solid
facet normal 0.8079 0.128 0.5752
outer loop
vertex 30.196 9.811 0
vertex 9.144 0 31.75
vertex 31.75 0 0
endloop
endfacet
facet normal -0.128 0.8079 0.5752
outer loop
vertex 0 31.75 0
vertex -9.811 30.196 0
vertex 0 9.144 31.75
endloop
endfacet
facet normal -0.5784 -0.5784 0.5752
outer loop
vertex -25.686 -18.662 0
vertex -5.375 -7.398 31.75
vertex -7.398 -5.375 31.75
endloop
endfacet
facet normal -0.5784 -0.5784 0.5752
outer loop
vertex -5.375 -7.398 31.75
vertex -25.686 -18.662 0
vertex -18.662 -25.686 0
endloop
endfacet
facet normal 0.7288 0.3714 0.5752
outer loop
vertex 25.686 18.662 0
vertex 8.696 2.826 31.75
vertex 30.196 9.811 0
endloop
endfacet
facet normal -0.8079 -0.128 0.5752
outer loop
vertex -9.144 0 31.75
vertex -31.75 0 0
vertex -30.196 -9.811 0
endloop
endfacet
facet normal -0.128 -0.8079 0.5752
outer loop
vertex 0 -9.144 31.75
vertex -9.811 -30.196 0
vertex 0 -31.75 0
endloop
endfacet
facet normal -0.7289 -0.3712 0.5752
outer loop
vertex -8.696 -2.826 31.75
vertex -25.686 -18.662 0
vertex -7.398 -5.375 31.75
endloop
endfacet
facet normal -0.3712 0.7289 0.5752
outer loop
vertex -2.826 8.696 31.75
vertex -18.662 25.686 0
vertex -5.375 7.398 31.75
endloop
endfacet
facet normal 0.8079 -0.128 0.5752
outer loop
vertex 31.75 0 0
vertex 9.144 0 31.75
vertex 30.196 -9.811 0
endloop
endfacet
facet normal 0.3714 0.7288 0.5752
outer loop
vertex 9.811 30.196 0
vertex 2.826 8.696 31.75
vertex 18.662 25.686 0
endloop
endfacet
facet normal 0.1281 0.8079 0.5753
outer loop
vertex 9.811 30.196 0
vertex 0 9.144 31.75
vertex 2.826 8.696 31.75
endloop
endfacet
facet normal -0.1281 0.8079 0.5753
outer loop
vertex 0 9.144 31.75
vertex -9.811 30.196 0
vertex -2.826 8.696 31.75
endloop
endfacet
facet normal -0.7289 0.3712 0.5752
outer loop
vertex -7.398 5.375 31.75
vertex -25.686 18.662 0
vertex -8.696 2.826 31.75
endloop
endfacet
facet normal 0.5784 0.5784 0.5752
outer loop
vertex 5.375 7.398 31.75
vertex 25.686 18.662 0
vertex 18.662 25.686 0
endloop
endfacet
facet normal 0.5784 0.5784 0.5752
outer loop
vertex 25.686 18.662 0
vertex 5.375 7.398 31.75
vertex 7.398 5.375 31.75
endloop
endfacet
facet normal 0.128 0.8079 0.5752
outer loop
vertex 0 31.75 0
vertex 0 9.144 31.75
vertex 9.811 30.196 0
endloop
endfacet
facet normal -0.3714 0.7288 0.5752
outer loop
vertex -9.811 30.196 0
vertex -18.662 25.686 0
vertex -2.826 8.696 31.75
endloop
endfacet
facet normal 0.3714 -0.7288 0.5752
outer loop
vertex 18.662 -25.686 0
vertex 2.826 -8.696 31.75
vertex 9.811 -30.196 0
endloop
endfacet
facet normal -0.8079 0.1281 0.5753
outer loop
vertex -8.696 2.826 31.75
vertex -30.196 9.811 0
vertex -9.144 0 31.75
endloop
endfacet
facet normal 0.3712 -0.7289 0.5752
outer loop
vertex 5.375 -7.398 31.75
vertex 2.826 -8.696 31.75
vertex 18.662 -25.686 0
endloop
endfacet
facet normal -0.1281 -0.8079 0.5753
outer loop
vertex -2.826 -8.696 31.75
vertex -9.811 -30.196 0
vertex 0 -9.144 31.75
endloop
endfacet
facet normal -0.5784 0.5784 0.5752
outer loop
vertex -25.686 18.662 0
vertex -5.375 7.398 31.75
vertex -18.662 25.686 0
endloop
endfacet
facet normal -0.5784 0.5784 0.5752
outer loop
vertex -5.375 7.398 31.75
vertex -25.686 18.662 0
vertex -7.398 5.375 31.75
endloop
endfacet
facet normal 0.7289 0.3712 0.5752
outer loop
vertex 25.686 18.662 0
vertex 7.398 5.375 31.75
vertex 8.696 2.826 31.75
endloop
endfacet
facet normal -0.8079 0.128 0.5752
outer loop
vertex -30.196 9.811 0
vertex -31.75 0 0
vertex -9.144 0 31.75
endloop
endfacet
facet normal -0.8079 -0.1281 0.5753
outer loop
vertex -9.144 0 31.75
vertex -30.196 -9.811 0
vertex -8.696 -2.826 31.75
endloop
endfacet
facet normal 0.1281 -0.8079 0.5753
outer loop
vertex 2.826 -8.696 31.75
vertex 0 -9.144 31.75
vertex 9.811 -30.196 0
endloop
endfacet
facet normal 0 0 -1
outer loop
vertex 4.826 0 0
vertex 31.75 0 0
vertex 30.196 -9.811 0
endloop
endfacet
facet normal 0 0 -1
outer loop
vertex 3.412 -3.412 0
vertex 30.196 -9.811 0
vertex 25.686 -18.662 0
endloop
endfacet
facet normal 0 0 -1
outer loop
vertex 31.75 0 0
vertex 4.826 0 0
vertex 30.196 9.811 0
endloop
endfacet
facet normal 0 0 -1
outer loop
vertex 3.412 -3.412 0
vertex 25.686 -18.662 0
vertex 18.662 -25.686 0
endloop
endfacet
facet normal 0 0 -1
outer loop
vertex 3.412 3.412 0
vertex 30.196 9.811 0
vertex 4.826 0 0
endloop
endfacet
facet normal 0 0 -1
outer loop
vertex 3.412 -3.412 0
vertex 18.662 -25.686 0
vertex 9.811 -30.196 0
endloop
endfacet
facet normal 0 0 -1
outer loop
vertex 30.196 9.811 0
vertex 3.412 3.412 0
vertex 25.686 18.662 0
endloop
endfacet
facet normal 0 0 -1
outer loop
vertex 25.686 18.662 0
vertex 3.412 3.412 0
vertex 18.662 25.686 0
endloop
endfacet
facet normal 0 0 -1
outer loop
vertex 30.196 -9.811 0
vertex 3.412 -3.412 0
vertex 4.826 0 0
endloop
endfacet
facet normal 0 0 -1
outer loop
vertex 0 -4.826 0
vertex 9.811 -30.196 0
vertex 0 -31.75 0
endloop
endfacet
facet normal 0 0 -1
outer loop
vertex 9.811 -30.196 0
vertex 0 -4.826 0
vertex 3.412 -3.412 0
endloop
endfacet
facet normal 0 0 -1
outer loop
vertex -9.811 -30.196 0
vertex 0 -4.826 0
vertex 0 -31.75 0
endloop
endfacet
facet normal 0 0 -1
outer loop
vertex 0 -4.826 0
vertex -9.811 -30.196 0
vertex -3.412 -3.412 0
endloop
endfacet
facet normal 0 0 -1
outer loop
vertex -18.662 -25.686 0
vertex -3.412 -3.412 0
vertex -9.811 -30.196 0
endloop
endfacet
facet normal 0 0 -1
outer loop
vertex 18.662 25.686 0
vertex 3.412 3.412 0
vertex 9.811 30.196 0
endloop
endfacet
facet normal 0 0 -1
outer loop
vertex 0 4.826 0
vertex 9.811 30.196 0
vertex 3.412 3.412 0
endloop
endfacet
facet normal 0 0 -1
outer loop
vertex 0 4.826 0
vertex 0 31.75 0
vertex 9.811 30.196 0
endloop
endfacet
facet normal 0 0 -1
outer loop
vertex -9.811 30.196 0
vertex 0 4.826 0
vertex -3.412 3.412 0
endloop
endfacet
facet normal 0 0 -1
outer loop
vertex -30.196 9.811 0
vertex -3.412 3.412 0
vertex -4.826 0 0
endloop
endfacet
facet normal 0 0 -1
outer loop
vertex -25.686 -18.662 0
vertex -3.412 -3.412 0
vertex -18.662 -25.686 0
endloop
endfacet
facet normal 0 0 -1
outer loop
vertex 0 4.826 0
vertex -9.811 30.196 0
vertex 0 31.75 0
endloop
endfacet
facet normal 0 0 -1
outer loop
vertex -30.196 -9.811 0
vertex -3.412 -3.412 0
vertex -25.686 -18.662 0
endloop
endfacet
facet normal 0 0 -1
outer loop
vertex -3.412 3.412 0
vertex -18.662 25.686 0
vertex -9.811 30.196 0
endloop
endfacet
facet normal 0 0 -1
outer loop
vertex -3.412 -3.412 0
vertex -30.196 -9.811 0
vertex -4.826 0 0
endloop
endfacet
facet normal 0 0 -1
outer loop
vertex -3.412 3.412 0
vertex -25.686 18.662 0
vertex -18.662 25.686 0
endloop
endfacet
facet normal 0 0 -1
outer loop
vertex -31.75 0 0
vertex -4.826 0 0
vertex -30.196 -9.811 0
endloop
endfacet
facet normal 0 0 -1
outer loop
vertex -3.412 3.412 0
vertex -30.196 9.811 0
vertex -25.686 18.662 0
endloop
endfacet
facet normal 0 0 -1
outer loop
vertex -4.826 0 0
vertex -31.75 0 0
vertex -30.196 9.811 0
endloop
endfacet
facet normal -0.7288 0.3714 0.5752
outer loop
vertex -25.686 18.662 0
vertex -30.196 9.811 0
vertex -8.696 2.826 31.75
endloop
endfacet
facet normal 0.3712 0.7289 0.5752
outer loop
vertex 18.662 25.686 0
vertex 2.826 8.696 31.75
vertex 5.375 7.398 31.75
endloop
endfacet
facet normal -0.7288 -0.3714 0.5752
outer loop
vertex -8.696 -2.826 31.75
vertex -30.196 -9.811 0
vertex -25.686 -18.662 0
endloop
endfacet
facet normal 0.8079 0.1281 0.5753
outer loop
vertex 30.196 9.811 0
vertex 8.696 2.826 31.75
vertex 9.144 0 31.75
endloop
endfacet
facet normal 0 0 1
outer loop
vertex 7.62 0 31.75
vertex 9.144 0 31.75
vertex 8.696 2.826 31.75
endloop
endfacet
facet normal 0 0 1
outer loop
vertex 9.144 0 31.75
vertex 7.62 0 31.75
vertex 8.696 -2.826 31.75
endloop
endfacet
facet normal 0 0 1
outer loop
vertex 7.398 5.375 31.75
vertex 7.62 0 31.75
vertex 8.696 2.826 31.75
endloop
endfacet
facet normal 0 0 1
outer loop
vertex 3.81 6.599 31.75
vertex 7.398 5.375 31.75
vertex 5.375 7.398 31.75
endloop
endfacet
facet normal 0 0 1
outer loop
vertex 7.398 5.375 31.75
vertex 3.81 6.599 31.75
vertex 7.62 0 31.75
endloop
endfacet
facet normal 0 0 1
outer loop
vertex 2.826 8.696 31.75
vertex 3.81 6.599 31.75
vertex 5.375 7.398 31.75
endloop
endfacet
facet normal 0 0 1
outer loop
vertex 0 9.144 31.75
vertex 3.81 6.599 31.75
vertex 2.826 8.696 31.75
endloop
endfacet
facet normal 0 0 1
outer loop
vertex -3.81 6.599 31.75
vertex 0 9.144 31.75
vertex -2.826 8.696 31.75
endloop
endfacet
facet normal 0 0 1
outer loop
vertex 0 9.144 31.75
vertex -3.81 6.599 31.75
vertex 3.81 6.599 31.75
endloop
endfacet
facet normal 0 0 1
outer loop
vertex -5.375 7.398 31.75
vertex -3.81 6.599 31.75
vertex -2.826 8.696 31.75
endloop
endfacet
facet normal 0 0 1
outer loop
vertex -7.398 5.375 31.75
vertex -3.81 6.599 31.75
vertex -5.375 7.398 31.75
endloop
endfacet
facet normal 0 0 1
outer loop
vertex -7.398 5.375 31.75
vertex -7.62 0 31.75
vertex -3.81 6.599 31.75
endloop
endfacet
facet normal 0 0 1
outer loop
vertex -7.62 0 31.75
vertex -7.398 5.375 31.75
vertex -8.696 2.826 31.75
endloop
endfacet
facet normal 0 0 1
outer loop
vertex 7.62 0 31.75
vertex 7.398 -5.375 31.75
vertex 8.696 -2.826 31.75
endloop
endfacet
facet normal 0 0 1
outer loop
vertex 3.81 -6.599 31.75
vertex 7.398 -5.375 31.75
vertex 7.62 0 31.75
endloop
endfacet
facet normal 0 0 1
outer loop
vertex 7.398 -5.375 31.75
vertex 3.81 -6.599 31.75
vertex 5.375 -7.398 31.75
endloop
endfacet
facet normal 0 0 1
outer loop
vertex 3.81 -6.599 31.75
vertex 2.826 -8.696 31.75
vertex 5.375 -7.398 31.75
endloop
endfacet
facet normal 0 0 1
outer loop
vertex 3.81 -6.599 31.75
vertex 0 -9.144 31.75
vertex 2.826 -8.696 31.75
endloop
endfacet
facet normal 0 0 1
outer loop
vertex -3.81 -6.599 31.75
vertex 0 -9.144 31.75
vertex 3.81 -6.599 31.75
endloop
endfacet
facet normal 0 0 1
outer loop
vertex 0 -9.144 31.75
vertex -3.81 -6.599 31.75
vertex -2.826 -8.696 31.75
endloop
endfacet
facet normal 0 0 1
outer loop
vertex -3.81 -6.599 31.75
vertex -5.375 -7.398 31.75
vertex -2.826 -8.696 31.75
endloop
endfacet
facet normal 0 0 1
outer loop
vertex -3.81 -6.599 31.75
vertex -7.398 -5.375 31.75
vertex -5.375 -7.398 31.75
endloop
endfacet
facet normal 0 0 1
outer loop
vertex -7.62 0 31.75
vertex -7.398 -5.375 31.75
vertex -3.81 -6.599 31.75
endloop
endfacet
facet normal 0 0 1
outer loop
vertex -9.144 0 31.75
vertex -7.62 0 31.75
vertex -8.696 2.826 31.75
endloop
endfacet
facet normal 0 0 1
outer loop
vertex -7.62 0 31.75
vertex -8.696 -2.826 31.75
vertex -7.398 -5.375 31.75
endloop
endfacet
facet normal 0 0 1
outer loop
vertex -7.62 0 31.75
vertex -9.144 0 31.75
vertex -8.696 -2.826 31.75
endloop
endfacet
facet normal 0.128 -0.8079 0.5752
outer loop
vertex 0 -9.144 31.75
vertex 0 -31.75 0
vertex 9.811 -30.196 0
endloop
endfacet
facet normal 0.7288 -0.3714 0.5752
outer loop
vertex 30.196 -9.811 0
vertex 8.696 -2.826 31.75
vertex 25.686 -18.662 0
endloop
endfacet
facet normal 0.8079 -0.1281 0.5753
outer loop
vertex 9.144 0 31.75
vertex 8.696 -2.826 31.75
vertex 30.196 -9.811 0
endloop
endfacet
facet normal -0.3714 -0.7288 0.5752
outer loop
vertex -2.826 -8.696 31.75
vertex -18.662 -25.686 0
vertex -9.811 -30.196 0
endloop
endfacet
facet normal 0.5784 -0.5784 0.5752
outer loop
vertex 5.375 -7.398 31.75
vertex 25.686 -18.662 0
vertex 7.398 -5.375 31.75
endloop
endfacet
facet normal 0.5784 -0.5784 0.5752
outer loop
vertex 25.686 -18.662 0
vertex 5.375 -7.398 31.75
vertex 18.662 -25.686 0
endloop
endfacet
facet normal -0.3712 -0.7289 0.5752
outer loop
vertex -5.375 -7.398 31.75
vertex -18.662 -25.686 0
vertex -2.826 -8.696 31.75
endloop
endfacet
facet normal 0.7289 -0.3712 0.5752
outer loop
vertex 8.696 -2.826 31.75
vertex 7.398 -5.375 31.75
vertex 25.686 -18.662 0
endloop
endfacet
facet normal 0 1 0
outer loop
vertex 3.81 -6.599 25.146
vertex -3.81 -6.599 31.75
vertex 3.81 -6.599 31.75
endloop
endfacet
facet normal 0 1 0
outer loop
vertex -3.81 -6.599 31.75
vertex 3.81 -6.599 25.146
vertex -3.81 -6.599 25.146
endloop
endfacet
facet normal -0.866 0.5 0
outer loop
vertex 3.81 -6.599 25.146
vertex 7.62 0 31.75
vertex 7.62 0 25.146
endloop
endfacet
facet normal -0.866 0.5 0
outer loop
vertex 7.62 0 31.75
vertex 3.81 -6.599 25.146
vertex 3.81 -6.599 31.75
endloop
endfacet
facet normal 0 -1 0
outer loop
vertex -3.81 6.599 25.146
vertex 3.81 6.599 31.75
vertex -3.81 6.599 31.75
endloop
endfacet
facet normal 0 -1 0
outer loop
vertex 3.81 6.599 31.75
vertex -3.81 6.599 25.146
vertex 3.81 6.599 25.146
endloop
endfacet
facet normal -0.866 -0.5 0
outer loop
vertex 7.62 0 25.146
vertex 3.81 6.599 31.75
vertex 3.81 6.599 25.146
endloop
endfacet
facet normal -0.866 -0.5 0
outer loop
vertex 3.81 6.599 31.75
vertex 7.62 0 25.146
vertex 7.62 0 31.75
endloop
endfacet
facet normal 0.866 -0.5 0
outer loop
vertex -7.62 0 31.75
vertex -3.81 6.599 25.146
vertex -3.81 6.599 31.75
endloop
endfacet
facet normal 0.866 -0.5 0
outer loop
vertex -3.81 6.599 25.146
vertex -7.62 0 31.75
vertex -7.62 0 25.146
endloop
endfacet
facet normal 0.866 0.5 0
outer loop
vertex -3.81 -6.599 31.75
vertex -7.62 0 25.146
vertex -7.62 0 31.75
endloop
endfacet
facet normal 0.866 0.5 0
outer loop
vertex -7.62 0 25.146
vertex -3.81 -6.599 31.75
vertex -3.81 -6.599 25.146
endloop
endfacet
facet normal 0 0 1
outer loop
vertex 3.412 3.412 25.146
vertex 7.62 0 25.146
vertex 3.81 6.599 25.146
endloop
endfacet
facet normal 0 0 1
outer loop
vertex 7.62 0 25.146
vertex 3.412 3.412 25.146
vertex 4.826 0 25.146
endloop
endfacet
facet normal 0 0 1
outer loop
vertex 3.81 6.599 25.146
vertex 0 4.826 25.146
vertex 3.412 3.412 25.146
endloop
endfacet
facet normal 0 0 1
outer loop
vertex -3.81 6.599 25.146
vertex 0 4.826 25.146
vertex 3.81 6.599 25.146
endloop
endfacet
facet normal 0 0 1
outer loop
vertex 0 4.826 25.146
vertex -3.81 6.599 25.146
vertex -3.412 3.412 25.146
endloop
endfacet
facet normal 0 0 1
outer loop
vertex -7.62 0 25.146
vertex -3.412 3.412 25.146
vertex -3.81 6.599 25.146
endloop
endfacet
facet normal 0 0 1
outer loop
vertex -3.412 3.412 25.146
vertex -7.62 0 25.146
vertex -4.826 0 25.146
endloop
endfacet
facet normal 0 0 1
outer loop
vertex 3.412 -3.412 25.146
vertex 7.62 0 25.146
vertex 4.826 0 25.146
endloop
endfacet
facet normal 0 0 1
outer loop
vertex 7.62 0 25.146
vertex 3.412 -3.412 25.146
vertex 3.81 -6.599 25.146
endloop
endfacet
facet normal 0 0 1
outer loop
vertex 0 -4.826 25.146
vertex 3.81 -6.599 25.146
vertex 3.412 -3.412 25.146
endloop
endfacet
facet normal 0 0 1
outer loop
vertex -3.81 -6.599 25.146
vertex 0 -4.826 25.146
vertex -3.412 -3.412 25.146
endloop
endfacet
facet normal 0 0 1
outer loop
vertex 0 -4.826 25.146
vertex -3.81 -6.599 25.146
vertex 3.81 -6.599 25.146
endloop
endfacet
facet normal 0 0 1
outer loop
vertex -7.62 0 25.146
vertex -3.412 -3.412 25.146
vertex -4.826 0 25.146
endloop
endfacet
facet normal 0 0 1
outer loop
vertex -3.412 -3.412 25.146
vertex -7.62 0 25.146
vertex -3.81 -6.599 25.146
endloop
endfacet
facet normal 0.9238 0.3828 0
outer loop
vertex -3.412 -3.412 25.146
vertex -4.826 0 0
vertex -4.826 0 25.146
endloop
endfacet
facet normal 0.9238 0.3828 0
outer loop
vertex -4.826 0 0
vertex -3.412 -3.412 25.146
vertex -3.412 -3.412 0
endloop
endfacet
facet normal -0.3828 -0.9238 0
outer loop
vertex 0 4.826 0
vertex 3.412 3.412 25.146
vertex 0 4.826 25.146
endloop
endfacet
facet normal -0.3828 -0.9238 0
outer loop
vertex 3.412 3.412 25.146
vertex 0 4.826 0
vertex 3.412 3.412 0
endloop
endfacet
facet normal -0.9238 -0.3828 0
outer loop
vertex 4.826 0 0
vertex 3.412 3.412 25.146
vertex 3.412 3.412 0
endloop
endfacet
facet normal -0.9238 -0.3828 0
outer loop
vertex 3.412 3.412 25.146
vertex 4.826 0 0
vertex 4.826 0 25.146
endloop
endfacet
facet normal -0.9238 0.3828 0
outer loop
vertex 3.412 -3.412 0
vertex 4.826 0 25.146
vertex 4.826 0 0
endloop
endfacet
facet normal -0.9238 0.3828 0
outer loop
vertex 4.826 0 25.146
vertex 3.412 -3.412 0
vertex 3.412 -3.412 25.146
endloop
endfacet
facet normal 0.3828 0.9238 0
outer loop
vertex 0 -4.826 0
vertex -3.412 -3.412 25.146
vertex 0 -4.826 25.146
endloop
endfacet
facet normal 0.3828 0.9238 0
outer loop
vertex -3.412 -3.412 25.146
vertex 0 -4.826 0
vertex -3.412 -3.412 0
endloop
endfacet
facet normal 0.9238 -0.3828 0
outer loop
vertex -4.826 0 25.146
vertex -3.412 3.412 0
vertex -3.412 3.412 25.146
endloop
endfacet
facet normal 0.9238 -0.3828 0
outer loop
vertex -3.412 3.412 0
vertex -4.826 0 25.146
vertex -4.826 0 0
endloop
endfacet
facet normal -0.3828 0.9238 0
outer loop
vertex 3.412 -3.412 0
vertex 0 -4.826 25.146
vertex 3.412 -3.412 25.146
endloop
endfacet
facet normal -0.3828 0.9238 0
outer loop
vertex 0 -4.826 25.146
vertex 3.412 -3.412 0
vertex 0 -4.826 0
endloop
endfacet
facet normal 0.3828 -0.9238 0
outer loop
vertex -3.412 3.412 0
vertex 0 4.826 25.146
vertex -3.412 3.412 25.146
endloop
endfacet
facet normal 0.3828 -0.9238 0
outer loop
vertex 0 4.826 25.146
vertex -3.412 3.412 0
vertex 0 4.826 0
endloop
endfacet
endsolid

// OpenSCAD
use <../Vitamins/Pipe.scad>;

module PipeDrillAdapter(pipe=Spec_TubingOnePointOneTwoFive(), extension=1/2, wall=2/16,
                        nutHeight=0.26, nutDiameter=0.58, boltDiameter=0.35) {
  totalHeight = wall+nutHeight+extension;

  difference() {
    
    // Body
    cylinder(r=PipeOuterRadius(pipe, PipeClearanceSnug())+wall, h=totalHeight, $fn=PipeFn(pipe));

    // Pipe hole
    translate([0,0,wall+nutHeight])
    Pipe(pipe=pipe, length=totalHeight+0.2);
    
    // Nut
    translate([0,0,wall])
    cylinder(r=nutDiameter/2, h=nutHeight+0.1, $fn=6);
    
    // Bolt
    translate([0,0,-0.1])
    cylinder(r=boltDiameter/2, h=wall+0.2, $fn=PipeFn(pipe)/2);
  }
}

module PipeCone(nutHeight=0.26, nutDiameter=0.6, boltDiameter=0.38, major=2.5, id=0.32) {
  difference() {
    
    // Body
    cylinder(r1=major/2, r2=nutDiameter*.6, h=(major/2), $fn=20);
    
    // Nut
    translate([0,0,(major/2) - nutHeight])
    cylinder(r=nutDiameter/2, h=nutHeight+0.1, $fn=6);
    
    // Bolt
    translate([0,0,-0.1])
    cylinder(r=boltDiameter/2, h=major, $fn=8);
  }
}

scale([25.4, 25.4, 25.4])
PipeCone();
//PipeDrillAdapter();
